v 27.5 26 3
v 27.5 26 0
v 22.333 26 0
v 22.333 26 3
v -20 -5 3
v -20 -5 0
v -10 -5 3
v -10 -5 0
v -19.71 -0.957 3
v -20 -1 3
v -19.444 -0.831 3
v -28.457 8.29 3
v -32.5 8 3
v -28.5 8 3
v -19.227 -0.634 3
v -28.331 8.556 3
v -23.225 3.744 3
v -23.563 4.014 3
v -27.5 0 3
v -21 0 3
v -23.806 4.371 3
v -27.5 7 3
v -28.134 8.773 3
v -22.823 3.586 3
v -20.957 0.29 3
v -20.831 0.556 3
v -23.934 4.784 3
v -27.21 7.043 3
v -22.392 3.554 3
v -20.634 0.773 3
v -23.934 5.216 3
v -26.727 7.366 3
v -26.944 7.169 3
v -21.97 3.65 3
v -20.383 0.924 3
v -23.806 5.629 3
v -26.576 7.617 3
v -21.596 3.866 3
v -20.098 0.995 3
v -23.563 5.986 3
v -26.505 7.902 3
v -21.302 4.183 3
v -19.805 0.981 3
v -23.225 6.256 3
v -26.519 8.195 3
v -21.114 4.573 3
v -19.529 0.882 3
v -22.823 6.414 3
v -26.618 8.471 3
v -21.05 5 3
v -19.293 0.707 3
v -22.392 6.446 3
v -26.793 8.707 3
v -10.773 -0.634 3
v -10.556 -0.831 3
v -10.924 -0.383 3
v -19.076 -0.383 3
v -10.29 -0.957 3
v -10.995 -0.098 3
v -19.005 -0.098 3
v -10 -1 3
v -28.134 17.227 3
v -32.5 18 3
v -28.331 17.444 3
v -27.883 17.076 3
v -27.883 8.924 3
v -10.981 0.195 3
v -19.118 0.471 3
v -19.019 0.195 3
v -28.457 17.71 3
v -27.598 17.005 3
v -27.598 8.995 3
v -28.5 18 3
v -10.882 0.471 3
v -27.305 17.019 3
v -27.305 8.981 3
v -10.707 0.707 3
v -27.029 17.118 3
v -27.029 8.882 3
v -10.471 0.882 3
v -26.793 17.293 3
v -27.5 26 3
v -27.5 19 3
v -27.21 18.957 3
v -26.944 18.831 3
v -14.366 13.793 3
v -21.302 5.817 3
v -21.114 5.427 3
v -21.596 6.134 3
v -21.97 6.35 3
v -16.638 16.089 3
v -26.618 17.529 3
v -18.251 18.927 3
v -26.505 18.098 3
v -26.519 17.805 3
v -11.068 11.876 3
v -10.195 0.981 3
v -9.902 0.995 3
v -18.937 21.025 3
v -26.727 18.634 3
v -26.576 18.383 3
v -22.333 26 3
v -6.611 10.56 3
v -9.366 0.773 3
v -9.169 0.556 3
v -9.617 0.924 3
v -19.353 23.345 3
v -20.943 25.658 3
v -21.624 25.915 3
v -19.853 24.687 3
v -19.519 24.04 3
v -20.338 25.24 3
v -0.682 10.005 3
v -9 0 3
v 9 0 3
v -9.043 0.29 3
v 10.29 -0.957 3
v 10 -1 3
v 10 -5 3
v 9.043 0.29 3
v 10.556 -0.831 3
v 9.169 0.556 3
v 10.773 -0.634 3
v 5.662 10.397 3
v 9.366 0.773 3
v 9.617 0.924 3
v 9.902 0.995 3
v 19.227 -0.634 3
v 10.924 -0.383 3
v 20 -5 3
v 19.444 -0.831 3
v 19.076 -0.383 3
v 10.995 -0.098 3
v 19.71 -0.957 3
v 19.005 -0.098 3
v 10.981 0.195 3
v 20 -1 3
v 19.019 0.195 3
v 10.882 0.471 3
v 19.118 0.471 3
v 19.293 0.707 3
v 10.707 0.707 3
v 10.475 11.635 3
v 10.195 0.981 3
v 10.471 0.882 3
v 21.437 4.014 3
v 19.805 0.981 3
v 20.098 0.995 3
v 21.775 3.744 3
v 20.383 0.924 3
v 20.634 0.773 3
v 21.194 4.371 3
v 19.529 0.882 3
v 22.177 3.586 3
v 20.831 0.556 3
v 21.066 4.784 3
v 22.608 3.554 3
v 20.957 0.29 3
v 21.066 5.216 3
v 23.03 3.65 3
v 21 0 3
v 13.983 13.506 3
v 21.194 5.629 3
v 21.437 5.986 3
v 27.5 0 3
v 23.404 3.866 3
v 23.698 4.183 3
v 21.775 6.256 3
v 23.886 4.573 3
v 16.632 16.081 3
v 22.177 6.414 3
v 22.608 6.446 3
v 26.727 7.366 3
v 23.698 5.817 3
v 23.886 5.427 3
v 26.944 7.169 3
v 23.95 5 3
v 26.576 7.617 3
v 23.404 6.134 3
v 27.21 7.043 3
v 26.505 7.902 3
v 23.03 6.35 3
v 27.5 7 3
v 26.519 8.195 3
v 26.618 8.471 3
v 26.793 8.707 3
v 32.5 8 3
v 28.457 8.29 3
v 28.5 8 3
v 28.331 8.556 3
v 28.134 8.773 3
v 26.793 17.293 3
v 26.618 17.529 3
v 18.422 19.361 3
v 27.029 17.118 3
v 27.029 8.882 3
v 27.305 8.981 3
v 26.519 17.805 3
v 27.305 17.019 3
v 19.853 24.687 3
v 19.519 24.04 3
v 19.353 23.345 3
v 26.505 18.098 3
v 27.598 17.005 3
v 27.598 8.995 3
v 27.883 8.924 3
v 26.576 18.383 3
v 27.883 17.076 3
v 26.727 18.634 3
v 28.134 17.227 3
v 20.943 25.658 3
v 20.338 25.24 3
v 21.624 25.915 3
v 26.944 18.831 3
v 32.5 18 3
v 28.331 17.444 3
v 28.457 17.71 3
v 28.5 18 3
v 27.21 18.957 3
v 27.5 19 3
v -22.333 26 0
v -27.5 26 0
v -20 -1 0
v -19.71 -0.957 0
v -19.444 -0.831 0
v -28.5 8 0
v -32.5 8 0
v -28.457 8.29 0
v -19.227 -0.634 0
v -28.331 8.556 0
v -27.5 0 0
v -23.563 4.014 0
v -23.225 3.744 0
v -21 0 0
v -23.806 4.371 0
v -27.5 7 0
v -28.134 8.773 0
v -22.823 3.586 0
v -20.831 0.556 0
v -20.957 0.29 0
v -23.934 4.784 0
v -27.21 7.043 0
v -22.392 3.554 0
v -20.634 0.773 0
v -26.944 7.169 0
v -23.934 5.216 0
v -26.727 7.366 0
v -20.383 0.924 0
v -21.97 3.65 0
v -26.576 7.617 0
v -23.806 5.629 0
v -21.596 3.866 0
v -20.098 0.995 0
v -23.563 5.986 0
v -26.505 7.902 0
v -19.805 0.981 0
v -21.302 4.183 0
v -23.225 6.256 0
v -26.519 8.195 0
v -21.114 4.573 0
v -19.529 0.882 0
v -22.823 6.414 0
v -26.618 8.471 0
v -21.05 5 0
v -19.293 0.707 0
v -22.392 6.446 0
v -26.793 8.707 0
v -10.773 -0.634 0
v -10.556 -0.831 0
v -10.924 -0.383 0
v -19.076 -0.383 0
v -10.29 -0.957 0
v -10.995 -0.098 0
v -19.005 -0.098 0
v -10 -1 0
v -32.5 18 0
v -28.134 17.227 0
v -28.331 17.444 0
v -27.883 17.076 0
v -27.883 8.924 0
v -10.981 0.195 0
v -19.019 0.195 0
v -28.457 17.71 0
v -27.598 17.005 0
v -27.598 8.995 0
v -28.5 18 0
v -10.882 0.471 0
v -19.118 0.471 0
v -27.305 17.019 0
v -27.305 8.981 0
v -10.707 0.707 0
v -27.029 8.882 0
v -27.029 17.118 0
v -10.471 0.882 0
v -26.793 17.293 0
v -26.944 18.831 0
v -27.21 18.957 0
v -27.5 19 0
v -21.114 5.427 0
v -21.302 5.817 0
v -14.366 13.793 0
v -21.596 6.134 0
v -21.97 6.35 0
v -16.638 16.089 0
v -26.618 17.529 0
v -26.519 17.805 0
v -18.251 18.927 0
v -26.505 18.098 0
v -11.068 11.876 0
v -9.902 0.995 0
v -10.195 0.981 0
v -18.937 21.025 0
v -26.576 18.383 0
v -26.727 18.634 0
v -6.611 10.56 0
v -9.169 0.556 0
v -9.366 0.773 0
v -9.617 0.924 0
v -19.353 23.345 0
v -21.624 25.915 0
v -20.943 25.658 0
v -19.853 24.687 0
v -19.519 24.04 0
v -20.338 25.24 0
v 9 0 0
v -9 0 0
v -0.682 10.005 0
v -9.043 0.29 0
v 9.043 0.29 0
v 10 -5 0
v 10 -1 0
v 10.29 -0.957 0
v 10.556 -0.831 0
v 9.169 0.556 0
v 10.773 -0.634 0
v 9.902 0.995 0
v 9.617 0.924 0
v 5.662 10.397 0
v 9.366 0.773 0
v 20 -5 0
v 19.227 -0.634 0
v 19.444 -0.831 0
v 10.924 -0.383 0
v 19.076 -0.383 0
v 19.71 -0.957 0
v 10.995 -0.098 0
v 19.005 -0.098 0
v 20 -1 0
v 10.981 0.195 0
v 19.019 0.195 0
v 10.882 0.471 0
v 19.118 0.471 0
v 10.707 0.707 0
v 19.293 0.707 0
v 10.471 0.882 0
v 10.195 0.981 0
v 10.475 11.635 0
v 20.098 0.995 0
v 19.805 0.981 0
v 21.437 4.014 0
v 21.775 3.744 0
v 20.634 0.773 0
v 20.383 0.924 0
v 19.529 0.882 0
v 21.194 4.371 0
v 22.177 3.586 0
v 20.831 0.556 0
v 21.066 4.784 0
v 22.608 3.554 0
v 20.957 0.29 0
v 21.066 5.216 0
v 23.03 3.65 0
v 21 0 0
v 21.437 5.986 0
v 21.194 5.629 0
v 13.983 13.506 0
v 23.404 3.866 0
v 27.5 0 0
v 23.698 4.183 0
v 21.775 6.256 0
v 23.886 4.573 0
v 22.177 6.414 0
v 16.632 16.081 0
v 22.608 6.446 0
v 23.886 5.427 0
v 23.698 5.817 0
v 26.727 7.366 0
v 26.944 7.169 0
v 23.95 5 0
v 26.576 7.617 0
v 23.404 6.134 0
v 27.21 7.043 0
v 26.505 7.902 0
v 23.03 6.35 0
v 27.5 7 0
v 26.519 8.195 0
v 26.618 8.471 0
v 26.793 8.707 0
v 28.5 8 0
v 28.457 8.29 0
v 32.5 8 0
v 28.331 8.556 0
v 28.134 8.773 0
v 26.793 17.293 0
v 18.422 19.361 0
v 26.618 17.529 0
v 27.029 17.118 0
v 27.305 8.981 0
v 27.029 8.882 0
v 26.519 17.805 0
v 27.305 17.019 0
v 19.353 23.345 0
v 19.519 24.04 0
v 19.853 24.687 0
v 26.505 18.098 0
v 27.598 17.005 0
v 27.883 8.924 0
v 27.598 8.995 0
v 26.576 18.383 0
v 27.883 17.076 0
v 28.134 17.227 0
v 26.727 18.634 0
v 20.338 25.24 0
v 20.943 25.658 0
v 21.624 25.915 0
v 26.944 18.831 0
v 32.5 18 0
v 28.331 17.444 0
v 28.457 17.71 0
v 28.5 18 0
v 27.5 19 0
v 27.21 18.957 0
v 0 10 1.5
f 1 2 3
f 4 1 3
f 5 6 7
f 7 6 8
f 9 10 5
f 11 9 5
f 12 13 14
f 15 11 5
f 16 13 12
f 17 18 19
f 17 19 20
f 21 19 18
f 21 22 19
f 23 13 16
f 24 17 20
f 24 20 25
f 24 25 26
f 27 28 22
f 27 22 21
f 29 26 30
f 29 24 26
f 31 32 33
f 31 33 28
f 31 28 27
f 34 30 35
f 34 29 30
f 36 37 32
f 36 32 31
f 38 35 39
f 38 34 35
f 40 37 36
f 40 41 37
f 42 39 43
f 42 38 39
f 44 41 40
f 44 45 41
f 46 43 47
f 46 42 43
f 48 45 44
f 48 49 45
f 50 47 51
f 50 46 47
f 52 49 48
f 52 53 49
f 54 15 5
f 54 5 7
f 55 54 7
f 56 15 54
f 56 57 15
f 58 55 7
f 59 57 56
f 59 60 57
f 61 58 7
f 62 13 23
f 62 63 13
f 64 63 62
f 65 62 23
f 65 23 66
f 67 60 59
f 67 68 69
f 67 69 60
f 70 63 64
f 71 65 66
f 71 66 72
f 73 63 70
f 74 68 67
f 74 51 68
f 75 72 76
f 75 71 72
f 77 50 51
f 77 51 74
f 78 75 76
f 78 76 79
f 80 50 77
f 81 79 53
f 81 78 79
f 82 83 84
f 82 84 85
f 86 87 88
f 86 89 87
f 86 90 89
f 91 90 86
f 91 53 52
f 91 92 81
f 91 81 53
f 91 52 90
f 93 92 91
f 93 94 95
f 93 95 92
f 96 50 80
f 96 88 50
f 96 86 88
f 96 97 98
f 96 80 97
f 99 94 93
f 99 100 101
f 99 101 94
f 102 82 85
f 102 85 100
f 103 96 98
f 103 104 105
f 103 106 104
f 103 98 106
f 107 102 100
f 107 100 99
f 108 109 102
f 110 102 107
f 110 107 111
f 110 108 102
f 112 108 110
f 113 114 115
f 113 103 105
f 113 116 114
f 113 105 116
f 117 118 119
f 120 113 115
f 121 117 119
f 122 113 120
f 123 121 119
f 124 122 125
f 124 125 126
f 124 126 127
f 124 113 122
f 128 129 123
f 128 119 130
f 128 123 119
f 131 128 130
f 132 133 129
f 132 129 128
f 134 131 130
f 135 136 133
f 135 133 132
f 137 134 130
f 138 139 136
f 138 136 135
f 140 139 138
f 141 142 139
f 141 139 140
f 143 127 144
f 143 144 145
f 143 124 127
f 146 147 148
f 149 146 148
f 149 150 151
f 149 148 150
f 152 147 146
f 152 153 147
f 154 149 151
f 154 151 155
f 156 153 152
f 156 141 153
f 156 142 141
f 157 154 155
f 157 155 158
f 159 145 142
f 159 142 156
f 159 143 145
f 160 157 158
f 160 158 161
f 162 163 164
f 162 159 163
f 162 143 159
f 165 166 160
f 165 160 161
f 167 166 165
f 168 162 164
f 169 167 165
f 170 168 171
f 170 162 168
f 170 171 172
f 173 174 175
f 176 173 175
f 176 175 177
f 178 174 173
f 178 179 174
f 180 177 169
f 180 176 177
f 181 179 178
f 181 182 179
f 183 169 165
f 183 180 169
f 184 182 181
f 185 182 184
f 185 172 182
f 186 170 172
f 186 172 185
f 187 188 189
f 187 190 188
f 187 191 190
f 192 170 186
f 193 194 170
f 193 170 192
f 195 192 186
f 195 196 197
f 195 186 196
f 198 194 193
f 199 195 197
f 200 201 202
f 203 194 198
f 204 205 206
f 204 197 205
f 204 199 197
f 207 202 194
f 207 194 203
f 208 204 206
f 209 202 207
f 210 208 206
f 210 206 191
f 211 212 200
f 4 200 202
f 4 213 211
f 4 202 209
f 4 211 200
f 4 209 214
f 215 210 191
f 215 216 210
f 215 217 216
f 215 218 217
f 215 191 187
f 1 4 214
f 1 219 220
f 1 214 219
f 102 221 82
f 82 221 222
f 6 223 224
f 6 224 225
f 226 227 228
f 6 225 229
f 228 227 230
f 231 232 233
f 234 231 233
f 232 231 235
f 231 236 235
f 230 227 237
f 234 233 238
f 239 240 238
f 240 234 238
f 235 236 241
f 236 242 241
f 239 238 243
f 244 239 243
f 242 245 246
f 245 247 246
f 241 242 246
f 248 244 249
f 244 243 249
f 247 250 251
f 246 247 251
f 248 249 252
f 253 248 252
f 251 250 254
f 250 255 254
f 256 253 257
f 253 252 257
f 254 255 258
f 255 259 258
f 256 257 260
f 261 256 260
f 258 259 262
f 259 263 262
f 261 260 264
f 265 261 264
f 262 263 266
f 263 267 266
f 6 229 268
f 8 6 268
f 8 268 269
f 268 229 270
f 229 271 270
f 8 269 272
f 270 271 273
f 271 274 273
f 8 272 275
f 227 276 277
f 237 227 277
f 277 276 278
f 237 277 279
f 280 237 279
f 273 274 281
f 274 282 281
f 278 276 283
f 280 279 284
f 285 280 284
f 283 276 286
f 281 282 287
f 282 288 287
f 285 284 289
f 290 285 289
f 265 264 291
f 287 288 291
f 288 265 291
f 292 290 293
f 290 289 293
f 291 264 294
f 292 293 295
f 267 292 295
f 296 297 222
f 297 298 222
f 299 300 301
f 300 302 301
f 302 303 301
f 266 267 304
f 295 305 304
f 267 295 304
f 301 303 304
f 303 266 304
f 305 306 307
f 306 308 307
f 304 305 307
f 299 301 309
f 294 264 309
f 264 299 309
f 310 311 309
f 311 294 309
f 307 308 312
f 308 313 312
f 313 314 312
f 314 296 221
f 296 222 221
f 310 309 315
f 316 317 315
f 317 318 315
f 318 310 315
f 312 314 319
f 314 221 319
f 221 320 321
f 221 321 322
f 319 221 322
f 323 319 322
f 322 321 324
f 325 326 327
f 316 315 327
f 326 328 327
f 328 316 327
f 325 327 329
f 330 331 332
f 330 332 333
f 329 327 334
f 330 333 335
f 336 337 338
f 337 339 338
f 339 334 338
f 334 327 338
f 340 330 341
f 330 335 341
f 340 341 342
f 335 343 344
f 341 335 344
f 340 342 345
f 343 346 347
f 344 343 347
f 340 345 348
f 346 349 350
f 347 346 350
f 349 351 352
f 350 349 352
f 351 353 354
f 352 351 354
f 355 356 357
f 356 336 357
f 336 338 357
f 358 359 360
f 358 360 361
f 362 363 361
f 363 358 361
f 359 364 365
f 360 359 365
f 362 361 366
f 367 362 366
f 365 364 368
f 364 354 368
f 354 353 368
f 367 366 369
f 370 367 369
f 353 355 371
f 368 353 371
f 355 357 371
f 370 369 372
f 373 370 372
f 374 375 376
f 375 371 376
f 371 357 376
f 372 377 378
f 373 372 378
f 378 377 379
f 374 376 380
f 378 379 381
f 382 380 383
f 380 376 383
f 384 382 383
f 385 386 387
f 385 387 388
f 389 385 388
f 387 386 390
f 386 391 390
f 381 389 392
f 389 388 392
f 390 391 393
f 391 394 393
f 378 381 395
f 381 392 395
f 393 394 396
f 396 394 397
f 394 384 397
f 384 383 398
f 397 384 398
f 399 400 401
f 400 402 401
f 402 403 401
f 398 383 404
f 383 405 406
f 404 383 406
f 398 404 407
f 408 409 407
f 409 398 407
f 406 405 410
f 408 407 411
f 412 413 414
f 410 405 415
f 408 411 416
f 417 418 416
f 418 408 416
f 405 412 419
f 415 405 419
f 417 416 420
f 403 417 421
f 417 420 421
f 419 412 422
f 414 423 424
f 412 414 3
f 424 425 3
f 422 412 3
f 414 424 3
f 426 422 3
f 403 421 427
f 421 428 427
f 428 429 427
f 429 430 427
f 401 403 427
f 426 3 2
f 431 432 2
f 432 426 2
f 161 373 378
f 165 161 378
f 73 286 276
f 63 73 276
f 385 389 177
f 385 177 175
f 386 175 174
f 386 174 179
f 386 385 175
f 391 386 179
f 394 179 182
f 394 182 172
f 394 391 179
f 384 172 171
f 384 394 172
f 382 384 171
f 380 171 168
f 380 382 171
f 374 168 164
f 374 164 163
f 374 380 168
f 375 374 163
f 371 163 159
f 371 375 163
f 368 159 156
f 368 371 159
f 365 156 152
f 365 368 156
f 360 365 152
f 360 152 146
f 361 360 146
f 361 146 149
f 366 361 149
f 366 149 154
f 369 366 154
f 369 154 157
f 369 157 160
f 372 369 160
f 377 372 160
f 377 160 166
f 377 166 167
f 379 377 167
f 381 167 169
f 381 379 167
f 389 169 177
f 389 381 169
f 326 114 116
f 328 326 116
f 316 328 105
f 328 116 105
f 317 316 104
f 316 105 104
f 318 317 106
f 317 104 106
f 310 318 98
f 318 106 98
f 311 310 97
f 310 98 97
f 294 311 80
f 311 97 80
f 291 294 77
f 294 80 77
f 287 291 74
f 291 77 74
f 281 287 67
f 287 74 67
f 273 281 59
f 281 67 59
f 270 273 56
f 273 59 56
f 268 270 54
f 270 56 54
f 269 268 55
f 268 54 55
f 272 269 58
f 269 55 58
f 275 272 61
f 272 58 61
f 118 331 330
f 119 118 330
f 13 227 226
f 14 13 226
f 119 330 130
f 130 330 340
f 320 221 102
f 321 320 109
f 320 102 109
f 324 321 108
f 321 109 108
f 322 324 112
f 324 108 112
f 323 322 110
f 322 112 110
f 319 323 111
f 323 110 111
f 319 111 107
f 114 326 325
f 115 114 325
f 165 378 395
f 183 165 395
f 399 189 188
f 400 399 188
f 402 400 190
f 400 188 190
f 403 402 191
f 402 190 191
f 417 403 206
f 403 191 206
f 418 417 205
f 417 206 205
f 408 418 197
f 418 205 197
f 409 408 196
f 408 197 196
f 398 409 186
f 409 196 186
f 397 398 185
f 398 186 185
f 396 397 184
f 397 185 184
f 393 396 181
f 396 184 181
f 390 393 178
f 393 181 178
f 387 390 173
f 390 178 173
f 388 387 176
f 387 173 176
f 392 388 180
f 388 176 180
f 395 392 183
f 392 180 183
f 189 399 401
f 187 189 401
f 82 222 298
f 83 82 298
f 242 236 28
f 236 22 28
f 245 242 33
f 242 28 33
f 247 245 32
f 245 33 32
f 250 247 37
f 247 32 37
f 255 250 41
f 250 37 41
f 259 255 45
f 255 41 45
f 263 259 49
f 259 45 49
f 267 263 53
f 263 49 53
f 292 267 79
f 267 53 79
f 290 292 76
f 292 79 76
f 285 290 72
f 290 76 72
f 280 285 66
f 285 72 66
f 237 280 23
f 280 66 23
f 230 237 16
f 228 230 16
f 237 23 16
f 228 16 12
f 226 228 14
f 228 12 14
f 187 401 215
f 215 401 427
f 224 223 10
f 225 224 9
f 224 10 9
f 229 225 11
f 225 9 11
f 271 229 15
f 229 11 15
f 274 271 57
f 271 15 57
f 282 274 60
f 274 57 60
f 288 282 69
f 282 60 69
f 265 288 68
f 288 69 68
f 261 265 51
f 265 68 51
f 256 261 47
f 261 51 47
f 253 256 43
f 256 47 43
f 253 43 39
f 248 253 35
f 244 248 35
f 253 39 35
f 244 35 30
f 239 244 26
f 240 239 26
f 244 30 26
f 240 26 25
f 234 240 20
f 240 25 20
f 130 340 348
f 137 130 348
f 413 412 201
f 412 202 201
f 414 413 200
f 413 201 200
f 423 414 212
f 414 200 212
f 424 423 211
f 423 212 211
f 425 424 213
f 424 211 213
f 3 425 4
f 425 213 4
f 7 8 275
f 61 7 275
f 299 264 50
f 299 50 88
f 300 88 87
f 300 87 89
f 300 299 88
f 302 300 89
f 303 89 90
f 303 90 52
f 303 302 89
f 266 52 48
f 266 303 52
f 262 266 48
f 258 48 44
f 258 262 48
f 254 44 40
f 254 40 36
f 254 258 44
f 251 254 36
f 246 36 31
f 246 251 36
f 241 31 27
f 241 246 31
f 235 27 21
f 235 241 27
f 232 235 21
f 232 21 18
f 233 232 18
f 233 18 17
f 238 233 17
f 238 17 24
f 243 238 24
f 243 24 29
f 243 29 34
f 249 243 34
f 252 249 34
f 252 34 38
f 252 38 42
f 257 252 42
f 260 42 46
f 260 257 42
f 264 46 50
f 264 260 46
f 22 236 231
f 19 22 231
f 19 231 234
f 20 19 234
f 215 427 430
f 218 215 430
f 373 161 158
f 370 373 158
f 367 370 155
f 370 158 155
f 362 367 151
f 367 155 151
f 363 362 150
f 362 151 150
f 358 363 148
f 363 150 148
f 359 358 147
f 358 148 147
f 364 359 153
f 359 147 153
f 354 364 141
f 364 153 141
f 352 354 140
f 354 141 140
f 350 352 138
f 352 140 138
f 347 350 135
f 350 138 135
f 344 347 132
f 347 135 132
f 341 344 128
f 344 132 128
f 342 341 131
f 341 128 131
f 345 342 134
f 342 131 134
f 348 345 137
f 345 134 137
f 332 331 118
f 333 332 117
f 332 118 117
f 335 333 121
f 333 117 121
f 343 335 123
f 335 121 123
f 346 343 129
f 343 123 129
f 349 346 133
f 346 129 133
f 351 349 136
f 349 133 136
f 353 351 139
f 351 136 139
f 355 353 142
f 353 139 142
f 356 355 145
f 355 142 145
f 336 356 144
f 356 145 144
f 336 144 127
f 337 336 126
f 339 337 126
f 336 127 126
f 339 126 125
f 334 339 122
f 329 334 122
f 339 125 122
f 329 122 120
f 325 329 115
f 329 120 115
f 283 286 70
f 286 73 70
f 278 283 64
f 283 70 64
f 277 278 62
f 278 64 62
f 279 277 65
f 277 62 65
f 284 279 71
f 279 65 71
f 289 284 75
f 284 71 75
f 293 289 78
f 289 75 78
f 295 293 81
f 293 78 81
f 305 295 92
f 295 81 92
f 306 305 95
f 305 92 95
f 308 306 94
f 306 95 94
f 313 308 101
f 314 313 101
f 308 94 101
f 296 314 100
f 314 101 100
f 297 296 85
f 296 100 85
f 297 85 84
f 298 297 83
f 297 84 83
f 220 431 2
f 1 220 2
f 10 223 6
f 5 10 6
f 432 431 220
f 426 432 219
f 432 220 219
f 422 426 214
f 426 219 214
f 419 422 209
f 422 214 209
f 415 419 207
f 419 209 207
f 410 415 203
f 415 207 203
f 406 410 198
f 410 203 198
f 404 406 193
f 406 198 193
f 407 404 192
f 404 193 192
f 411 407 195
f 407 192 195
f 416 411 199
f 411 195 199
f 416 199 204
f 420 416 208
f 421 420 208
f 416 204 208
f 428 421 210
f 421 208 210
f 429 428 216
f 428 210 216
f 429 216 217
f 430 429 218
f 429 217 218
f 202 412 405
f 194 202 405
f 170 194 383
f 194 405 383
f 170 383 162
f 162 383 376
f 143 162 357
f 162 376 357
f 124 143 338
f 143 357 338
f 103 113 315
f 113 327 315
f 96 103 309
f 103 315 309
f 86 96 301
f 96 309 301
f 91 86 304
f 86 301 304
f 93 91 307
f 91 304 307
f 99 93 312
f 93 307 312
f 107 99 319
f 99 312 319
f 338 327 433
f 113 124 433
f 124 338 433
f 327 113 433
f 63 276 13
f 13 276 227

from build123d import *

# Parameters (mm, degrees)
EXTRUDE_1_OUTLINE_R = 1.45
EXTRUDE_1_DEPTH     = 3
SKETCH_2_R          = 1
CUT_EXTRUDE_1_DEPTH = 42.728287915
FILLET_1_R          = 3


# Read off the part's stored shape, not the designer's step: 凸台-拉伸1
with BuildPart() as part:
    # 凸台-拉伸1 outline → 凸台-拉伸1 (new body)
    with BuildSketch(Plane.XY):
        with BuildLine():
            Line((32.5, 8), (32.5, 18))
            Line((32.5, 18), (27.5, 18))
            Line((27.5, 18), (27.5, 26))
            Line((27.5, 26), (19.5, 26))
            add(Edge.make_bspline(
                [(19.5, 26), (19.5, 10), (-19.5, 10), (-19.5, 26)],
                knots=[0, 0, 0, 1, 2, 2, 2], degree=2))
            Line((-19.5, 26), (-27.5, 26))
            Line((-27.5, 26), (-27.5, 18))
            Line((-27.5, 18), (-32.5, 18))
            Line((-32.5, 18), (-32.5, 8))
            Line((-32.5, 8), (-27.5, 8))
            Line((-27.5, 8), (-27.5, 0))
            Line((-27.5, 0), (-20, 0))
            Line((-20, 0), (-20, -5))
            Line((-20, -5), (-10, -5))
            Line((-10, -5), (-10, 0))
            Line((-10, 0), (10, 0))
            Line((10, 0), (10, -5))
            Line((10, -5), (20, -5))
            Line((20, -5), (20, 0))
            Line((20, 0), (27.5, 0))
            Line((27.5, 0), (27.5, 8))
            Line((27.5, 8), (32.5, 8))
        make_face()
        with Locations((-22.5, 5)):
            Circle(EXTRUDE_1_OUTLINE_R, mode=Mode.SUBTRACT)
        with Locations((22.5, 5)):
            Circle(EXTRUDE_1_OUTLINE_R, mode=Mode.SUBTRACT)
    extrude(amount=EXTRUDE_1_DEPTH)

    # 草图2 → 切除-拉伸1 (cut, through all)
    with BuildSketch(Plane.XY.offset(3)):
        with Locations((-27.5, 18)):
            Circle(SKETCH_2_R)
        with Locations((-27.5, 8)):
            Circle(SKETCH_2_R)
        with Locations((-20, 0)):
            Circle(SKETCH_2_R)
        with Locations((-10, 0)):
            Circle(SKETCH_2_R)
        with Locations((10, 0)):
            Circle(SKETCH_2_R)
        with Locations((20, 0)):
            Circle(SKETCH_2_R)
        with Locations((27.5, 8)):
            Circle(SKETCH_2_R)
        with Locations((27.5, 18)):
            Circle(SKETCH_2_R)
    extrude(amount=-CUT_EXTRUDE_1_DEPTH, mode=Mode.SUBTRACT)

    # 圆角1
    fillet_1_edges = [part.edges().sort_by_distance(p)[0] for p in [
        (19.5, 26, 1.5),
        (-19.5, 26, 1.5),
    ]]
    fillet(fillet_1_edges, radius=FILLET_1_R)


solid = part.part
